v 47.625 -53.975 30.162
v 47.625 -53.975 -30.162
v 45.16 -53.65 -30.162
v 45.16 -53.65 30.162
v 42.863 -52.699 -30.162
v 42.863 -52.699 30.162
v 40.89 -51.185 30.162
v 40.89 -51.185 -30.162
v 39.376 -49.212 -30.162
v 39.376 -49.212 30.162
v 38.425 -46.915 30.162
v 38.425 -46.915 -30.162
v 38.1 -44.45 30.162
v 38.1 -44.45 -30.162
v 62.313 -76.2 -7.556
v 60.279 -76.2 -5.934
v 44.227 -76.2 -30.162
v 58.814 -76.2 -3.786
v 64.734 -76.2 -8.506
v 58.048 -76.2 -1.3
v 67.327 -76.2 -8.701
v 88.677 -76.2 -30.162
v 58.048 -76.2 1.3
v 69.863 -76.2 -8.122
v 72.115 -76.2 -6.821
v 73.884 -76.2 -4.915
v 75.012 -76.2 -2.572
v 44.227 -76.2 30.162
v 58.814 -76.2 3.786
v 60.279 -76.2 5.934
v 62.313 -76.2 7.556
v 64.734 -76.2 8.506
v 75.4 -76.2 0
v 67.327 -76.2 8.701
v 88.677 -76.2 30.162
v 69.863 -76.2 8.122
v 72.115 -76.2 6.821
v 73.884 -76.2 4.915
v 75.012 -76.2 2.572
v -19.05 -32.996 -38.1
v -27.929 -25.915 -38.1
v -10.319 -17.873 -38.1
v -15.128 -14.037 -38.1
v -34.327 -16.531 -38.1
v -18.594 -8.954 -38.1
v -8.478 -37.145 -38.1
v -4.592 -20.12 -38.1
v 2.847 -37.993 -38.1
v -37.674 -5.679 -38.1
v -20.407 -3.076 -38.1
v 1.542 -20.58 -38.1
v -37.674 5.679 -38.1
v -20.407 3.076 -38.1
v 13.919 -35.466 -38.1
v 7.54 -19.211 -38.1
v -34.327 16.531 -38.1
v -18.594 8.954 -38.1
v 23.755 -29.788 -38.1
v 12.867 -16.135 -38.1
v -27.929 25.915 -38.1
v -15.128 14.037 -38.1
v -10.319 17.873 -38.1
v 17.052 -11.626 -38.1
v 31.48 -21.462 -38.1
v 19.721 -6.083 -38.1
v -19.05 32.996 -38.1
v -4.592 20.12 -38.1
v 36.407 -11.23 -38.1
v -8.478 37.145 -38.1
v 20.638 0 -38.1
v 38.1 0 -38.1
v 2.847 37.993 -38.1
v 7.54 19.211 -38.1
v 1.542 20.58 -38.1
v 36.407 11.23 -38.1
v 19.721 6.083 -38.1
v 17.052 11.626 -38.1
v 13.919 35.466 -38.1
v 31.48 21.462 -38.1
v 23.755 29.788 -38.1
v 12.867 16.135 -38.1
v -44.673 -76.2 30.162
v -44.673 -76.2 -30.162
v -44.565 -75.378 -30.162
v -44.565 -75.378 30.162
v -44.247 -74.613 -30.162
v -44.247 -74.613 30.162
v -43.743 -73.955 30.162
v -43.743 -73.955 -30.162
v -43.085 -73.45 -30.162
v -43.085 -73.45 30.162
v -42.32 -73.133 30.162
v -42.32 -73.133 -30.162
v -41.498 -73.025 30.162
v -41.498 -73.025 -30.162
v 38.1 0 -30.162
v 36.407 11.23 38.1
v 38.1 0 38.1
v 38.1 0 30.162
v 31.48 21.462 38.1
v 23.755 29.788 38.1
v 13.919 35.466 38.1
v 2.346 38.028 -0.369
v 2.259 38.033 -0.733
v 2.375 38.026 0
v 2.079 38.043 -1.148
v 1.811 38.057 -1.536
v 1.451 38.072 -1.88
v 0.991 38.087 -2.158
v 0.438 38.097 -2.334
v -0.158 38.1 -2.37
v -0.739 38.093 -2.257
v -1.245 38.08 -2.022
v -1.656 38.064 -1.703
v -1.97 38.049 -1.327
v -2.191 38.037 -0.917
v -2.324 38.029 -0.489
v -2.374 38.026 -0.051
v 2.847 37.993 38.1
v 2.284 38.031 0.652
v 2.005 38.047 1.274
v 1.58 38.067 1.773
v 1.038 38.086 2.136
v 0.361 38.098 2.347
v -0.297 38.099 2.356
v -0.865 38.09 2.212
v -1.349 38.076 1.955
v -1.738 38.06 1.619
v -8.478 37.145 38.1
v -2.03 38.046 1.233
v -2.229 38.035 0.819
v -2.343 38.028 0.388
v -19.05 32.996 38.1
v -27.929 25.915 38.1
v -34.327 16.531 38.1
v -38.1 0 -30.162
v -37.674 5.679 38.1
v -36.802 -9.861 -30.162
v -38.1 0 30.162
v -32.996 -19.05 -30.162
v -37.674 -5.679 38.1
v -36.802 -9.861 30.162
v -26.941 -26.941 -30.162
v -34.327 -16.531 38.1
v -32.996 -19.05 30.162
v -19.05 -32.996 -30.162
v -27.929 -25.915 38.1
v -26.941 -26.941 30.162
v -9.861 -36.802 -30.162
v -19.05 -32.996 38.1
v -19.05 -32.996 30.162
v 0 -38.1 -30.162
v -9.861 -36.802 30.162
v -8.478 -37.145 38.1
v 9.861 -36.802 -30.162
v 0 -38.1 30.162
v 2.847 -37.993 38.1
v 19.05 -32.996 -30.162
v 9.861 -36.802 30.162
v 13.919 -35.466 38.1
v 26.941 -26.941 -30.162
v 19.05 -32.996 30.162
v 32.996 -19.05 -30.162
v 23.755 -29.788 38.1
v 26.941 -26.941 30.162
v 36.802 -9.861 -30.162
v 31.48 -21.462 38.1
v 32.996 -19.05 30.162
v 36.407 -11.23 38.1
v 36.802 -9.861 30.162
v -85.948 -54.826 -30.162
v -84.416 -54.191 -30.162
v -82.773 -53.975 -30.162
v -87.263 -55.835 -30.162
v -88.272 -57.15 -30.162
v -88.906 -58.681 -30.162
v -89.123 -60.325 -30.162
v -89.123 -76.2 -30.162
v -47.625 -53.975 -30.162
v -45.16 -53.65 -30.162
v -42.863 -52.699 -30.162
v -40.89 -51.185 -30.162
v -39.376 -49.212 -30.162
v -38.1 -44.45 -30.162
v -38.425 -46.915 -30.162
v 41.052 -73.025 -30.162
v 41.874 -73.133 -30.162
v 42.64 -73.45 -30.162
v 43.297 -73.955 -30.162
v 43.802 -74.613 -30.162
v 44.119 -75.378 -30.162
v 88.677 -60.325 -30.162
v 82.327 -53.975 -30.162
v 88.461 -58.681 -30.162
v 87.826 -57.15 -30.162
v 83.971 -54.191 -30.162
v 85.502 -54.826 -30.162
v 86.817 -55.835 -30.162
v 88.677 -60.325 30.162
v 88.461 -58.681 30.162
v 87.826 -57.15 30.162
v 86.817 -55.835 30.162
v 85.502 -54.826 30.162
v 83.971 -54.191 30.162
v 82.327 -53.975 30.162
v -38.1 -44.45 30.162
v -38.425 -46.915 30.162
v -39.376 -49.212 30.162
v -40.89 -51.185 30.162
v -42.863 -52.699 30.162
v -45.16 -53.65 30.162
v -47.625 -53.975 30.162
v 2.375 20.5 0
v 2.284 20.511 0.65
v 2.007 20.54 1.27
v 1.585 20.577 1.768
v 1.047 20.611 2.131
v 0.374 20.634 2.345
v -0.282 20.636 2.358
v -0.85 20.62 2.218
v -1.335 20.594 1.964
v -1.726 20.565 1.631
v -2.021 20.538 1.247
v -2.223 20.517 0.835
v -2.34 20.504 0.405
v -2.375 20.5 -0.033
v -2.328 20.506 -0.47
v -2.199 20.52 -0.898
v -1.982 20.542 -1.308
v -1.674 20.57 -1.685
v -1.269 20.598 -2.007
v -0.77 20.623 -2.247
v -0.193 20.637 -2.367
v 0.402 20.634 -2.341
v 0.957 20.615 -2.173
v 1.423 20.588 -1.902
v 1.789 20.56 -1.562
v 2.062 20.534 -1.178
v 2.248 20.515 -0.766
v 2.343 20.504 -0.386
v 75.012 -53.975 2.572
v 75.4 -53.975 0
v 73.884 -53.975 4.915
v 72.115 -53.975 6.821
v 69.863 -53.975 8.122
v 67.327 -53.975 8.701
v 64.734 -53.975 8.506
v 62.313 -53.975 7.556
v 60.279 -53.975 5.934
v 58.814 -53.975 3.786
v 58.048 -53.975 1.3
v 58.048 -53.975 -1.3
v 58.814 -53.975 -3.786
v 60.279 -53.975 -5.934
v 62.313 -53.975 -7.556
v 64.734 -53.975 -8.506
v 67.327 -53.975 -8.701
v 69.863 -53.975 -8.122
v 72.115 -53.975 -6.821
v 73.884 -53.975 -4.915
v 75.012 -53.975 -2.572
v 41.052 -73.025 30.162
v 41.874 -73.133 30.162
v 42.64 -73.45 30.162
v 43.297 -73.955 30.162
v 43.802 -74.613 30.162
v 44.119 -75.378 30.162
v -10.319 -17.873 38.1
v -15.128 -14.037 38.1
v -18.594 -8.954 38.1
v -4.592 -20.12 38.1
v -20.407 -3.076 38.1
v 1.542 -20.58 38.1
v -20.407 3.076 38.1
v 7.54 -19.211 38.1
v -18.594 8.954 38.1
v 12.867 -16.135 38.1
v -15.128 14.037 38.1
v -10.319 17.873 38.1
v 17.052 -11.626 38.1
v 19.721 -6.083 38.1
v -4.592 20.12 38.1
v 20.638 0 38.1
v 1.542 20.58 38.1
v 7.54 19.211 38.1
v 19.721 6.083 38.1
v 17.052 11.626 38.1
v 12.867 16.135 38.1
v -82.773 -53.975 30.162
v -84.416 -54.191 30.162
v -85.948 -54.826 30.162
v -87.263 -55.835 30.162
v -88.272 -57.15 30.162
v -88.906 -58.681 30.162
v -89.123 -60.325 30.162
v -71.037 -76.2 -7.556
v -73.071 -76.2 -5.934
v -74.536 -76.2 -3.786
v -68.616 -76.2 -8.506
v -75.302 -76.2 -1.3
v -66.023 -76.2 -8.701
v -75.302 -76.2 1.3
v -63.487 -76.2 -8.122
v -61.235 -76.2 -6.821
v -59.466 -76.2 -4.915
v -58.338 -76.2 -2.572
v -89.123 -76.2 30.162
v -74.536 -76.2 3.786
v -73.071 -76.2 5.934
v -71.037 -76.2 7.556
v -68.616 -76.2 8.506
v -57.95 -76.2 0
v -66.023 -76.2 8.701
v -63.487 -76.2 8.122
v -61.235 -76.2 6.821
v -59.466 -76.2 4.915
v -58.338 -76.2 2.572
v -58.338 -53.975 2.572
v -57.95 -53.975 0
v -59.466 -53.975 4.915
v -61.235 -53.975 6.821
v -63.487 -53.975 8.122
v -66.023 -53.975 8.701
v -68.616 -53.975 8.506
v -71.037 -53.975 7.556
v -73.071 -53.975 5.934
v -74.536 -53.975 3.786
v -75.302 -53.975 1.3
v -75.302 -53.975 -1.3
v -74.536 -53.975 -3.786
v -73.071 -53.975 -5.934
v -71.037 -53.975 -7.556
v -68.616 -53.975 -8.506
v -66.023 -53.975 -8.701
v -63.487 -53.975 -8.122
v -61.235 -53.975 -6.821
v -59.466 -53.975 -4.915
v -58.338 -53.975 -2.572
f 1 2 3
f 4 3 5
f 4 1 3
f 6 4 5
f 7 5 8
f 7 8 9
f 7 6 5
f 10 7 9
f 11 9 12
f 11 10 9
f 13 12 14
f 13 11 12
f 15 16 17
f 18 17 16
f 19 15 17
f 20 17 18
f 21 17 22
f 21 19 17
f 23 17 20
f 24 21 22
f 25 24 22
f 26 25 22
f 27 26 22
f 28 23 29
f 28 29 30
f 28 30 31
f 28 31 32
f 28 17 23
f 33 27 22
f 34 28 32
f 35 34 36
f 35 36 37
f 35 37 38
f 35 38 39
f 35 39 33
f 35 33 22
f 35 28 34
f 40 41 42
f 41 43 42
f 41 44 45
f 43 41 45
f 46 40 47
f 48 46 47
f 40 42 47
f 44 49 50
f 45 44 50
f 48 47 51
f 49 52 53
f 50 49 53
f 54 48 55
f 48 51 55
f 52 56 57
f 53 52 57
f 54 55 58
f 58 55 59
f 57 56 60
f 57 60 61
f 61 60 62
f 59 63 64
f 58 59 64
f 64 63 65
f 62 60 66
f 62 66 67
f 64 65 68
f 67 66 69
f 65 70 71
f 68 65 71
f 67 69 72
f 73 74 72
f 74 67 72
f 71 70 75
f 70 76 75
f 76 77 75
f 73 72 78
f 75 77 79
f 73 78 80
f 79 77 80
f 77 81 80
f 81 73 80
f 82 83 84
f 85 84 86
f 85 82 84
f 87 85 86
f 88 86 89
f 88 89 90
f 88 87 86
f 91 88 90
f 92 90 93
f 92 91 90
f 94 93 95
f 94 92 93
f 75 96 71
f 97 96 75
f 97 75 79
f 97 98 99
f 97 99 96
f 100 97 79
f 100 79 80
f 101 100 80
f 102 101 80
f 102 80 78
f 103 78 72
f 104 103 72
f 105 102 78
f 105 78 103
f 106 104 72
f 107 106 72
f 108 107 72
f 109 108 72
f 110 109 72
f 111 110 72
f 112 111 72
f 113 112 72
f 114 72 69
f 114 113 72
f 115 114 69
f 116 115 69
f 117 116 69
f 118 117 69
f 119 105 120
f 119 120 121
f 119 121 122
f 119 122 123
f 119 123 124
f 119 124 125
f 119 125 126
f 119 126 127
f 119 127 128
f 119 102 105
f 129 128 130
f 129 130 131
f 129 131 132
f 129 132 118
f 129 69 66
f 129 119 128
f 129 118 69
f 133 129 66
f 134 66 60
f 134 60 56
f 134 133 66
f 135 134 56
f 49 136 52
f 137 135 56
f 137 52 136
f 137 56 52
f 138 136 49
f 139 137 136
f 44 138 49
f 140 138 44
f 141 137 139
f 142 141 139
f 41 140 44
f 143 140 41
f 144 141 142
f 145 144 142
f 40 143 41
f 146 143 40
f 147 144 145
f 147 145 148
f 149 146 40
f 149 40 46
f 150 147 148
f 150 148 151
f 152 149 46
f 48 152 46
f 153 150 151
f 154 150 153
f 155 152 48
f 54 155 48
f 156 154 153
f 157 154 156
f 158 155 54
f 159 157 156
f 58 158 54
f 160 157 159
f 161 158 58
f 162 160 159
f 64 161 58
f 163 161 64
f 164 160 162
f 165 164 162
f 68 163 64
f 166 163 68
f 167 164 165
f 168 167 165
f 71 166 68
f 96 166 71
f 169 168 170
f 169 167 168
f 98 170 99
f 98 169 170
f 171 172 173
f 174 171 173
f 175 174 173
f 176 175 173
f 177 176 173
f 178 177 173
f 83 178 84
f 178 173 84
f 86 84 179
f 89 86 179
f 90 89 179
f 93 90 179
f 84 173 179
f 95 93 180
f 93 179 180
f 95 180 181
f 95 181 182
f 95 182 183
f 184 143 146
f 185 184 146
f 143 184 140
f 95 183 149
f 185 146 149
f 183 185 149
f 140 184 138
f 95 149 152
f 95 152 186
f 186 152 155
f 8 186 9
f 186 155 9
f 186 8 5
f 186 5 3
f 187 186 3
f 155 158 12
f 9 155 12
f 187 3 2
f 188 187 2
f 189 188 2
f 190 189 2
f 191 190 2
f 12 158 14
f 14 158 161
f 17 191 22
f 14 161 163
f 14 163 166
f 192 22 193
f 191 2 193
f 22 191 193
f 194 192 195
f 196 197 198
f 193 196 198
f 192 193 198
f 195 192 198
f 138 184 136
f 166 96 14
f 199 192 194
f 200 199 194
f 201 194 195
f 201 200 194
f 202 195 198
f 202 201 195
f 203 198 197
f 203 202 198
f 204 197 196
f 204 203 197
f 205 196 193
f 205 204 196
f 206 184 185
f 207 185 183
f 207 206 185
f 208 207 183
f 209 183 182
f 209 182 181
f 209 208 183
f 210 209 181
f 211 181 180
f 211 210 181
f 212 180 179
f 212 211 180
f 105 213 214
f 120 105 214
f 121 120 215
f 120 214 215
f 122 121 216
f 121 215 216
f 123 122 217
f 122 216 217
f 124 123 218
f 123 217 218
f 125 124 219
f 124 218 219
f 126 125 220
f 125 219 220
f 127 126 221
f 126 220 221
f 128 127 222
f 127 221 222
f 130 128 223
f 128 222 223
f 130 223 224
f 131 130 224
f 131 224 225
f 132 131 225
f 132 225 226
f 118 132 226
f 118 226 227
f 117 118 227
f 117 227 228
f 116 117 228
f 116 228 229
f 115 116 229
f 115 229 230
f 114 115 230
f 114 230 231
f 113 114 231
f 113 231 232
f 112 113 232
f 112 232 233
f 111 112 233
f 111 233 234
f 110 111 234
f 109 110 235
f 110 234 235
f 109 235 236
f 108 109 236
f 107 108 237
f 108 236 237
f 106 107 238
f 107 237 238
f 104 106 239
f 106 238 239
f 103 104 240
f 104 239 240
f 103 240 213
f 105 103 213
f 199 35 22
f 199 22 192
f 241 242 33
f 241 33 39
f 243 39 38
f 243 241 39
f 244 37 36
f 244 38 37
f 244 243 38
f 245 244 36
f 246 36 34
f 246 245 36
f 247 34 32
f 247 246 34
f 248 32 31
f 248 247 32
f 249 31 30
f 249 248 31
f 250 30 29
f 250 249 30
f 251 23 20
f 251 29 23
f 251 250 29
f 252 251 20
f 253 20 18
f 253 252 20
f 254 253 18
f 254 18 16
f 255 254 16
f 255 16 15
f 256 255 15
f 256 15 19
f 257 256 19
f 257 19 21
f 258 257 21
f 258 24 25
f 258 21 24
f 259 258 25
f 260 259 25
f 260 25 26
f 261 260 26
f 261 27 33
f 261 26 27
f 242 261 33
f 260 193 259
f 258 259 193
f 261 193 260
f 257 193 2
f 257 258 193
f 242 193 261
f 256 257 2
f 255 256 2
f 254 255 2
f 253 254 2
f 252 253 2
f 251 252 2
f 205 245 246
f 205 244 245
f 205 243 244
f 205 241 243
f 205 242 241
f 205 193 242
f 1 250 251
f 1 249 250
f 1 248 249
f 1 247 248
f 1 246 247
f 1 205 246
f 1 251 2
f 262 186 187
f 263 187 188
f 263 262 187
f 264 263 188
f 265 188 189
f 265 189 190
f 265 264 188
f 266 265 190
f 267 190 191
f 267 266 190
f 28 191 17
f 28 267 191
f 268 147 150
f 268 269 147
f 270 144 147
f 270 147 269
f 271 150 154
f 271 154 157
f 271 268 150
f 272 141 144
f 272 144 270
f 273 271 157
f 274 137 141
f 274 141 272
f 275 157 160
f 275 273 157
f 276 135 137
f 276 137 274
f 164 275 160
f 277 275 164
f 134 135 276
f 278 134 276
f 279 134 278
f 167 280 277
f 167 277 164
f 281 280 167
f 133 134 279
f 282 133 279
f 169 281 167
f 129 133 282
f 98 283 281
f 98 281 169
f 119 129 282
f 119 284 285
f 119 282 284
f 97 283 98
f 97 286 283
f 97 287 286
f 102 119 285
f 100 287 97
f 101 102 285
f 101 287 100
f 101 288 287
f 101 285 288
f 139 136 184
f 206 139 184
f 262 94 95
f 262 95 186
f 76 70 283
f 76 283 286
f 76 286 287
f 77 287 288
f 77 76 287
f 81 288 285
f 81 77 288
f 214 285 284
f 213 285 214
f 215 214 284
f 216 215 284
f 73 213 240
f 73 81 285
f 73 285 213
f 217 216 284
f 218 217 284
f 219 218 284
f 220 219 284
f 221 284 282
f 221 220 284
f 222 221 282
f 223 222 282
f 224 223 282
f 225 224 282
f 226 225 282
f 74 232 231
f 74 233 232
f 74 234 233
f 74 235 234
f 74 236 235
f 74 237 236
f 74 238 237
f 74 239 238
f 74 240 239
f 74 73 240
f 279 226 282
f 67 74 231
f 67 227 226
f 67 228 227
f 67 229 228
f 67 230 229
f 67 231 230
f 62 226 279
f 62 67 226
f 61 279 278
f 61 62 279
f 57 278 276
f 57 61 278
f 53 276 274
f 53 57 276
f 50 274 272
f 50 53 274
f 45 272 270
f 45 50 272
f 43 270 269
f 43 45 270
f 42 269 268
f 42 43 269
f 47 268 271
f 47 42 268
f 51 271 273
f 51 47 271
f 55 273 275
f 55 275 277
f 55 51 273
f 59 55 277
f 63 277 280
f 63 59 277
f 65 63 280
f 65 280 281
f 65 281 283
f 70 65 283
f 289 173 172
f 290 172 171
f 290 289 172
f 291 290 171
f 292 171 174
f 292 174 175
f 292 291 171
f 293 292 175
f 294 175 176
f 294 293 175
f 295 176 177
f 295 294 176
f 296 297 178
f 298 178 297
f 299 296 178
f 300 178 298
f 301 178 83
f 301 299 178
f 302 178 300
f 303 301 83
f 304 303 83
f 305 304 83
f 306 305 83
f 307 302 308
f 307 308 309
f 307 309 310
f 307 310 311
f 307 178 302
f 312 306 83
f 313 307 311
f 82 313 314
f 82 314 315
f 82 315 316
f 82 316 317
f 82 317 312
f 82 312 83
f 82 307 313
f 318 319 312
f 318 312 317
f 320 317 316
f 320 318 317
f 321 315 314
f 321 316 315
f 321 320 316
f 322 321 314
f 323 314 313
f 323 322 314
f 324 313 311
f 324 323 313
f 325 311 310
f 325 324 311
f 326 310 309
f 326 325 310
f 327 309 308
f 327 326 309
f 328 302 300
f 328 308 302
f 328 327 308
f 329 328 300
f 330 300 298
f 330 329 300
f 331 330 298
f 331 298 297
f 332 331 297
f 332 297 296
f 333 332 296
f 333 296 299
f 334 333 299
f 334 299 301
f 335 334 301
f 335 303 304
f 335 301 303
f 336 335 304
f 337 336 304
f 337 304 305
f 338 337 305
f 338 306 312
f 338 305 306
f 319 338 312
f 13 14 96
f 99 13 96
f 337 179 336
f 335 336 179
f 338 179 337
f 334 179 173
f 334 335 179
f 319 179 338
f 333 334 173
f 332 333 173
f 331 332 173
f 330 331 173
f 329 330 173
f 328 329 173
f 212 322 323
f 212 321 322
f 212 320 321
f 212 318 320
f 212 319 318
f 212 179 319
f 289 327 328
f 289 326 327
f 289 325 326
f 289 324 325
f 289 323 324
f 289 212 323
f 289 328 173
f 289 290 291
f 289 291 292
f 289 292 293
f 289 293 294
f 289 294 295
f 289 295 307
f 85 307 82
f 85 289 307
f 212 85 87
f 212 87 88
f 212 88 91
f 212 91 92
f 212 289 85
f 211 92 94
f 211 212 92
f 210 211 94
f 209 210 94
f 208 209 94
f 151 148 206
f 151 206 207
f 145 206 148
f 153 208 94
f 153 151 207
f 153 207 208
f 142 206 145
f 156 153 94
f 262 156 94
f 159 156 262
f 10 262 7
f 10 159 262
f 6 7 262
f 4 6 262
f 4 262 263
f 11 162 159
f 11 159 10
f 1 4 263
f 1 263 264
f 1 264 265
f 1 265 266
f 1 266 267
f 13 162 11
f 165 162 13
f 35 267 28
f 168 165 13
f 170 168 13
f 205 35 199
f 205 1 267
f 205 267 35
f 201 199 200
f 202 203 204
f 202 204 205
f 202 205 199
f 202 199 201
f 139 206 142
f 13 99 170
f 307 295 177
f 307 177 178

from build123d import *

# Parameters (mm, degrees)
F1_R     = 38.1
F1_R_2   = 26.9875
F1_R_3   = 20.6375
F2_DEPTH = 38.1
F3_DEPTH = 30.1625
F4_R     = 8.7249
F5_DEPTH = 254
F6_R     = 2.3749
F7_DEPTH = 50.8


with BuildPart() as f2:
    # F1 (on Top) → F2 (new body, symmetric)
    with BuildSketch(Plane.XY):
        Circle(F1_R)
        Circle(F1_R_2, mode=Mode.SUBTRACT)
        Circle(F1_R_2)
        Circle(F1_R_3, mode=Mode.SUBTRACT)
    extrude(amount=F2_DEPTH, both=True)

    # F0 (on Top) → F3 (join, symmetric)
    with BuildSketch(Plane.XY):
        with BuildLine():
            ThreePointArc((38.1, 0), (26.940768, -26.940768), (0, -38.1))
            Line((0, -38.1), (0, -73.025))
            Line((0, -73.025), (41.052193, -73.025))
            ThreePointArc((41.052193, -73.025), (43.297257, -73.954936), (44.227193, -76.2))
            Line((44.227193, -76.2), (88.677193, -76.2))
            Line((88.677193, -76.2), (88.677193, -60.325))
            ThreePointArc((88.677193, -60.325), (86.817321, -55.834872), (82.327193, -53.975))
            Line((82.327193, -53.975), (47.625, -53.975))
            ThreePointArc((47.625, -53.975), (40.889808, -51.185192), (38.1, -44.45))
            Line((38.1, -44.45), (38.1, 0))
        make_face()
        with BuildLine():
            Line((0, -73.025), (0, -38.1))
            ThreePointArc((0, -38.1), (-26.940768, -26.940768), (-38.1, 0))
            Line((-38.1, 0), (-38.1, -44.45))
            ThreePointArc((-38.1, -44.45), (-40.889808, -51.185192), (-47.625, -53.975))
            Line((-47.625, -53.975), (-82.772807, -53.975))
            ThreePointArc((-82.772807, -53.975), (-87.262935, -55.834872), (-89.122807, -60.325))
            Line((-89.122807, -60.325), (-89.122807, -76.2))
            Line((-89.122807, -76.2), (-44.672807, -76.2))
            ThreePointArc((-44.672807, -76.2), (-43.742871, -73.954936), (-41.497807, -73.025))
            Line((-41.497807, -73.025), (0, -73.025))
        make_face()
    extrude(amount=F3_DEPTH, both=True)

    # F4 (on Front) → F5 (cut)
    with BuildSketch(Plane.XZ):
        with Locations((-66.675, 0)):
            Circle(F4_R)
        with Locations((66.675, 0)):
            Circle(F4_R)
    extrude(amount=F5_DEPTH, mode=Mode.SUBTRACT)

    # F6 (on Front) → F7 (cut)
    with BuildSketch(Plane.XZ):
        Circle(F6_R)
    extrude(amount=-F7_DEPTH, mode=Mode.SUBTRACT)


solid = f2.part
